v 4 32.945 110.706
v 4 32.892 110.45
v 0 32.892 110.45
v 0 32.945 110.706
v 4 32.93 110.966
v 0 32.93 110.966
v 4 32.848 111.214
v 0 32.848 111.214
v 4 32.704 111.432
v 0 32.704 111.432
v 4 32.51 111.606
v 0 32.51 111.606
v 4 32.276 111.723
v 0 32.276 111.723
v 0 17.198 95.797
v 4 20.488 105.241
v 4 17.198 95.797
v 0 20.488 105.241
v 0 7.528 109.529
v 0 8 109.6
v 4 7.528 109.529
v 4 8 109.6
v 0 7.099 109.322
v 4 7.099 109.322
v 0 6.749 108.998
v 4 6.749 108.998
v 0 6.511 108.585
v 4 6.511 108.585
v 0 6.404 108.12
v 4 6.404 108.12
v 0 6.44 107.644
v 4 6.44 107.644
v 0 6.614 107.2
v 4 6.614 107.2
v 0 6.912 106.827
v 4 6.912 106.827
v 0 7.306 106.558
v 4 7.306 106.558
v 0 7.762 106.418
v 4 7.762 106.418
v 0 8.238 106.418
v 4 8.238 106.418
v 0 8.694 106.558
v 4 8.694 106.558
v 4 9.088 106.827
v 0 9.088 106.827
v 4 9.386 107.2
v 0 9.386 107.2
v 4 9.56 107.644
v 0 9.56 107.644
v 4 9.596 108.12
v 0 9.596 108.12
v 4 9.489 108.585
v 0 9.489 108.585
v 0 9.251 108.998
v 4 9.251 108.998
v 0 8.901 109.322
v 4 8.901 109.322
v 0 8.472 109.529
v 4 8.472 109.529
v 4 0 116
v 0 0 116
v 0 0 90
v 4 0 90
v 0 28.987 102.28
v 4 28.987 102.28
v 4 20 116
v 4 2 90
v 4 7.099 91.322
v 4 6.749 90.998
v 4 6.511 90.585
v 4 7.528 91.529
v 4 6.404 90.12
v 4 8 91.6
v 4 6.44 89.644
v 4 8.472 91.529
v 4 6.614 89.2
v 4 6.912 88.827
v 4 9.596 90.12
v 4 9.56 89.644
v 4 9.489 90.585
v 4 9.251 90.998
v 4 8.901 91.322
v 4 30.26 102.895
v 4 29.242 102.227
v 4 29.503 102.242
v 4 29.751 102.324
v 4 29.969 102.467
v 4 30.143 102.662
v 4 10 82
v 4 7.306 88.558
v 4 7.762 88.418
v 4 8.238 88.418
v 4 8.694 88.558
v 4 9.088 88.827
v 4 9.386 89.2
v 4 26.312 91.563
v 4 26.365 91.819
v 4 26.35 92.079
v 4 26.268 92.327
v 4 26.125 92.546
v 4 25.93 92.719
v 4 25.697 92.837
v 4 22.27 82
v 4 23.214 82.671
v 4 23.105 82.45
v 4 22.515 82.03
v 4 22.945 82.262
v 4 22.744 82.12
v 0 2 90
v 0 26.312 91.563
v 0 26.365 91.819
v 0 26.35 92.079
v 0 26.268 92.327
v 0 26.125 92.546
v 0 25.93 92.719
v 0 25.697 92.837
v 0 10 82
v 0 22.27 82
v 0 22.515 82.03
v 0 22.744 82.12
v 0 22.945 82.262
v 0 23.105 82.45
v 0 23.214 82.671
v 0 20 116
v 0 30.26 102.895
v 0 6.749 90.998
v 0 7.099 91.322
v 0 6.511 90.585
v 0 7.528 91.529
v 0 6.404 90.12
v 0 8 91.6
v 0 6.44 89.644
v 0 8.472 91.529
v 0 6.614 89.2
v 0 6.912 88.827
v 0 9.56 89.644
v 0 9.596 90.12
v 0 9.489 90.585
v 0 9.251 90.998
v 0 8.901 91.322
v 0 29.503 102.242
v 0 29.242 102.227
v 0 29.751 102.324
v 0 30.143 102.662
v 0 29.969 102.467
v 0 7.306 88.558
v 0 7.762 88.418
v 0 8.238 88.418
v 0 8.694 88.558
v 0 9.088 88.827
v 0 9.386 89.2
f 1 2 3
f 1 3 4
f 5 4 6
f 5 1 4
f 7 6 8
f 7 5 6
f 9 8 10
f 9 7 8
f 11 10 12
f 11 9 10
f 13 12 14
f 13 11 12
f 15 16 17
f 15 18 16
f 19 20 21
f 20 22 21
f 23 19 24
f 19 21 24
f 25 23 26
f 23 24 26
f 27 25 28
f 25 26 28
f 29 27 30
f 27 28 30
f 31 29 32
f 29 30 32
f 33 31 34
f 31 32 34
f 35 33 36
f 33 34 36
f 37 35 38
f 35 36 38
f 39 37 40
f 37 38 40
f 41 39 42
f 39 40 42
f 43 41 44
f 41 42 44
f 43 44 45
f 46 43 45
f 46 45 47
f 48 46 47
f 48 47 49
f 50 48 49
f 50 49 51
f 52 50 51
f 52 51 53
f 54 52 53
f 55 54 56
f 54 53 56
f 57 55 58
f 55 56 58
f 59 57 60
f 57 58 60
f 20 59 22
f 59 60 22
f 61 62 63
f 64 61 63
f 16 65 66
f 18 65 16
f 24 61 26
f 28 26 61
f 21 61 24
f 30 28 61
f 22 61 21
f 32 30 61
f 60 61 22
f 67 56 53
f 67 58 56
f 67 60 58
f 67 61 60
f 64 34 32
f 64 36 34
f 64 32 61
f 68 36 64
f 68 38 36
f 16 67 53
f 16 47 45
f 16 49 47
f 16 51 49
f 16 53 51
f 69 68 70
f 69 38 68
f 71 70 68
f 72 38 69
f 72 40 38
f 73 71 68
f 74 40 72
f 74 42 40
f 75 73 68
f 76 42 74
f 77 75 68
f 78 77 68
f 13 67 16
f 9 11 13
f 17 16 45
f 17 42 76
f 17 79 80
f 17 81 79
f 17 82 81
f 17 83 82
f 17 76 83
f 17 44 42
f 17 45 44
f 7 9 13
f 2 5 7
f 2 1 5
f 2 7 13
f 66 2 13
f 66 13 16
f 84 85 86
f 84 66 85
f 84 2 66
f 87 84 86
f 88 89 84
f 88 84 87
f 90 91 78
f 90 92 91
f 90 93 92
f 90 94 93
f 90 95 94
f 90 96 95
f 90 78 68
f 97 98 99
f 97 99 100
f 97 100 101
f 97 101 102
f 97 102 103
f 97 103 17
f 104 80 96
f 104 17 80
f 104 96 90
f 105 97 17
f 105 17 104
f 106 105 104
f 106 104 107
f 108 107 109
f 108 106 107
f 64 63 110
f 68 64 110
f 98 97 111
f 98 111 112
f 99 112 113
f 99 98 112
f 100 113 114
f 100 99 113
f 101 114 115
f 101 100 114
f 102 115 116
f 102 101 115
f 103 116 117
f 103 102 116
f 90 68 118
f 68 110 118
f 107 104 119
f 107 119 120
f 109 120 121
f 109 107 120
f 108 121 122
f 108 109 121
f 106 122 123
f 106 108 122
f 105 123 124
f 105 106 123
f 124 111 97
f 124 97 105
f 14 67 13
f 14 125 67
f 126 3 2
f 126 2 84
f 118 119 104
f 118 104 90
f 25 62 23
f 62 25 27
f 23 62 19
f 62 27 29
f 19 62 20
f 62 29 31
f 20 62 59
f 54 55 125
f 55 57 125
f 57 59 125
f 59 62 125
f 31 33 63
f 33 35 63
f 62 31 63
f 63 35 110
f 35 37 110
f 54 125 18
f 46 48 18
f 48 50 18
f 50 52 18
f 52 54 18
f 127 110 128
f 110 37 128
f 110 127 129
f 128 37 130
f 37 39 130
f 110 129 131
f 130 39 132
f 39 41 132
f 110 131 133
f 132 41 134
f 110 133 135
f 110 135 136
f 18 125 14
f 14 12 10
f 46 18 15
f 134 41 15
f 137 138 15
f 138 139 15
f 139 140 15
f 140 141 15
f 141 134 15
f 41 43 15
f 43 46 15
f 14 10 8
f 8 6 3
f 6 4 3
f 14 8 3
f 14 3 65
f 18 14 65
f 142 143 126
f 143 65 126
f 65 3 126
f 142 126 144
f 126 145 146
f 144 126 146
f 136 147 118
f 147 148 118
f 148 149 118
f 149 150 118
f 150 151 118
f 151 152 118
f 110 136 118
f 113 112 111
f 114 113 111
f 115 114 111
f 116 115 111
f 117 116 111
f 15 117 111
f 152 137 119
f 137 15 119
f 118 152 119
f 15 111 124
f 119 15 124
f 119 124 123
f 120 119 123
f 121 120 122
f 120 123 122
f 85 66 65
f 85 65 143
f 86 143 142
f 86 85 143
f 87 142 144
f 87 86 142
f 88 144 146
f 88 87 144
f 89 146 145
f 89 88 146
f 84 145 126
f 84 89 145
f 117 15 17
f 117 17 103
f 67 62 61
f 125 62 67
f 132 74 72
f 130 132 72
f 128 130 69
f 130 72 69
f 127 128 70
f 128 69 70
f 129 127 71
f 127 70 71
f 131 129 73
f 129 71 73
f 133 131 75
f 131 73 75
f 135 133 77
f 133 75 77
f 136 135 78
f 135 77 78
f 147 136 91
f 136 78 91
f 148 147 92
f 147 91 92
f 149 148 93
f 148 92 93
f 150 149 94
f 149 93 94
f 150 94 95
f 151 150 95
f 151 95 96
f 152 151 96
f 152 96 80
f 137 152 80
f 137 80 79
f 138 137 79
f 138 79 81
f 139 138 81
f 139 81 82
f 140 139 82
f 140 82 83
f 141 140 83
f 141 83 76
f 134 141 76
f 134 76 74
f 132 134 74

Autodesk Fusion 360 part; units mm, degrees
sketch "スケッチ1" plane through (0, 0, 0) normal (1, 0, 0) x (0, 0, -1)
  line L0 (-116, 0) -> (-116, 20)
  line L1 (-116, 20) -> (-111.3943, 33.2207)
  line L2 (-111.3943, 33.2207) -> (-101.951, 29.931)
  line L3 (-101.951, 29.931) -> (-105.2407, 20.4876)
  line L4 (-105.2407, 20.4876) -> (-95.7973, 17.1978)
  line L5 (-14, 252) -> (0, 252)
  line L6 (-95.7973, 17.1978) -> (-79.3485, 64.4147)
  line L7 (-79.3485, 64.4147) -> (-65.1834, 59.4801)
  line L8 (-65.1834, 59.4801) -> (-63.8675, 63.2574)
  line L9 (-63.8675, 63.2574) -> (-78.0326, 68.1921)
  line L10 (-78.0326, 68.1921) -> (-38.5555, 181.5127)
  line L11 (-38.5555, 181.5127) -> (-24.3904, 176.578)
  line L12 (-24.3904, 176.578) -> (-23.0745, 180.3554)
  line L13 (-23.0745, 180.3554) -> (-37.2396, 185.29)
  line L14 (-37.2396, 185.29) -> (-14, 252)
  line L15 (-116, 0) -> (-70, 0)
  line L16 (-70, 0) -> (-70, -4)
  line L17 (-70, -4) -> (-50, -4)
  line L18 (-50, -4) -> (-50, 0)
  line L19 (-50, 0) -> (0, 0)
  line L20 (0, 252) -> (0, 165)
  line L21 (0, 165) -> (4, 165)
  line L22 (4, 165) -> (4, 145)
  line L23 (4, 145) -> (0, 145)
  line L24 (0, 145) -> (0, 0)
  line L25 (4, 155) -> (-13.5, 155)
  line L26 (-60, -4) -> (-60, 13.5)
  line L27 (-64.1481, 77.6509) -> (-33.5533, 165.4743)
  line L28 (-10, 10) -> (-30, 10)
  line L29 (-30, 10) -> (-30, 30)
  line L30 (-30, 30) -> (-10, 30)
  line L31 (-10, 30) -> (-10, 10)
  line L32 (-108, 8) -> (-90, 8)
  line L33 (-102.8799, 19.6651) -> (-98.1582, 18.0203)
  line L34 (-98.1582, 18.0203) -> (-99.1451, 15.1873)
  line L35 (-99.1451, 15.1873) -> (-103.8668, 16.8321)
  line L36 (-103.8668, 16.8321) -> (-102.8799, 19.6651)
  line L37 (-92.5076, 26.6412) -> (-82, 22.9807)
  line L38 (-82, 22.9807) -> (-82, 0)
  line L39 (-90, 0) -> (-90, 2)
  line L40 (-90, 2) -> (-82, 10)
  dimension "d1" = 116
  dimension "d2" = 20
  dimension "d3" = 14
  dimension "d4" = 10
  dimension "d5" = 10
  dimension "d6" = 10
  dimension "d9" = 14
  dimension "d11" = 252
  dimension "d12" = 248.642
  dimension "d13" = 4
  dimension "d14" = 4
  dimension "d15" = 120
  dimension "d16" = 50
  dimension "d17" = 15
  dimension "d18" = 20
  dimension "d19" = 4
  dimension "d20" = 50
  dimension "d21" = 4
  dimension "d22" = 20
  dimension "d23" = 145
  dimension "d24" = 17.5
  dimension "d25" = 17.5
  dimension "d31" = 10
  dimension "d32" = 13.5
  dimension "d33" = 13.5
  dimension "d36" = 10
  dimension "d37" = 20
  dimension "d38" = 20
  dimension "d39" = 10
  dimension "d40" = 8
  dimension "d41" = 8
  dimension "d42" = 18
  dimension "d43" = 5
  dimension "d44" = 3
  dimension "d45" = 34
  dimension "d46" = 135
  dimension "d47" = 2
  dimension "d48" = 8
extrude "押し出し1" add sketch "スケッチ1" along normal blind 4 contours L0 L1 L2 L3 L4 L6 L15 L34 L35 L36 L37 L38 L39 L40 | L4 L33 L34 L35 L36
hole "穴1" at (0, 8, 90) at (0, 8, 108) direction (1, 0, 0) diameter 3.2 end through all
fillet "フィレット1" radius 1 4 edges at (2, 29.931, 101.951) (2, 33.2207, 111.3943) (2, 26.6412, 92.5076) (2, 22.9807, 82)
